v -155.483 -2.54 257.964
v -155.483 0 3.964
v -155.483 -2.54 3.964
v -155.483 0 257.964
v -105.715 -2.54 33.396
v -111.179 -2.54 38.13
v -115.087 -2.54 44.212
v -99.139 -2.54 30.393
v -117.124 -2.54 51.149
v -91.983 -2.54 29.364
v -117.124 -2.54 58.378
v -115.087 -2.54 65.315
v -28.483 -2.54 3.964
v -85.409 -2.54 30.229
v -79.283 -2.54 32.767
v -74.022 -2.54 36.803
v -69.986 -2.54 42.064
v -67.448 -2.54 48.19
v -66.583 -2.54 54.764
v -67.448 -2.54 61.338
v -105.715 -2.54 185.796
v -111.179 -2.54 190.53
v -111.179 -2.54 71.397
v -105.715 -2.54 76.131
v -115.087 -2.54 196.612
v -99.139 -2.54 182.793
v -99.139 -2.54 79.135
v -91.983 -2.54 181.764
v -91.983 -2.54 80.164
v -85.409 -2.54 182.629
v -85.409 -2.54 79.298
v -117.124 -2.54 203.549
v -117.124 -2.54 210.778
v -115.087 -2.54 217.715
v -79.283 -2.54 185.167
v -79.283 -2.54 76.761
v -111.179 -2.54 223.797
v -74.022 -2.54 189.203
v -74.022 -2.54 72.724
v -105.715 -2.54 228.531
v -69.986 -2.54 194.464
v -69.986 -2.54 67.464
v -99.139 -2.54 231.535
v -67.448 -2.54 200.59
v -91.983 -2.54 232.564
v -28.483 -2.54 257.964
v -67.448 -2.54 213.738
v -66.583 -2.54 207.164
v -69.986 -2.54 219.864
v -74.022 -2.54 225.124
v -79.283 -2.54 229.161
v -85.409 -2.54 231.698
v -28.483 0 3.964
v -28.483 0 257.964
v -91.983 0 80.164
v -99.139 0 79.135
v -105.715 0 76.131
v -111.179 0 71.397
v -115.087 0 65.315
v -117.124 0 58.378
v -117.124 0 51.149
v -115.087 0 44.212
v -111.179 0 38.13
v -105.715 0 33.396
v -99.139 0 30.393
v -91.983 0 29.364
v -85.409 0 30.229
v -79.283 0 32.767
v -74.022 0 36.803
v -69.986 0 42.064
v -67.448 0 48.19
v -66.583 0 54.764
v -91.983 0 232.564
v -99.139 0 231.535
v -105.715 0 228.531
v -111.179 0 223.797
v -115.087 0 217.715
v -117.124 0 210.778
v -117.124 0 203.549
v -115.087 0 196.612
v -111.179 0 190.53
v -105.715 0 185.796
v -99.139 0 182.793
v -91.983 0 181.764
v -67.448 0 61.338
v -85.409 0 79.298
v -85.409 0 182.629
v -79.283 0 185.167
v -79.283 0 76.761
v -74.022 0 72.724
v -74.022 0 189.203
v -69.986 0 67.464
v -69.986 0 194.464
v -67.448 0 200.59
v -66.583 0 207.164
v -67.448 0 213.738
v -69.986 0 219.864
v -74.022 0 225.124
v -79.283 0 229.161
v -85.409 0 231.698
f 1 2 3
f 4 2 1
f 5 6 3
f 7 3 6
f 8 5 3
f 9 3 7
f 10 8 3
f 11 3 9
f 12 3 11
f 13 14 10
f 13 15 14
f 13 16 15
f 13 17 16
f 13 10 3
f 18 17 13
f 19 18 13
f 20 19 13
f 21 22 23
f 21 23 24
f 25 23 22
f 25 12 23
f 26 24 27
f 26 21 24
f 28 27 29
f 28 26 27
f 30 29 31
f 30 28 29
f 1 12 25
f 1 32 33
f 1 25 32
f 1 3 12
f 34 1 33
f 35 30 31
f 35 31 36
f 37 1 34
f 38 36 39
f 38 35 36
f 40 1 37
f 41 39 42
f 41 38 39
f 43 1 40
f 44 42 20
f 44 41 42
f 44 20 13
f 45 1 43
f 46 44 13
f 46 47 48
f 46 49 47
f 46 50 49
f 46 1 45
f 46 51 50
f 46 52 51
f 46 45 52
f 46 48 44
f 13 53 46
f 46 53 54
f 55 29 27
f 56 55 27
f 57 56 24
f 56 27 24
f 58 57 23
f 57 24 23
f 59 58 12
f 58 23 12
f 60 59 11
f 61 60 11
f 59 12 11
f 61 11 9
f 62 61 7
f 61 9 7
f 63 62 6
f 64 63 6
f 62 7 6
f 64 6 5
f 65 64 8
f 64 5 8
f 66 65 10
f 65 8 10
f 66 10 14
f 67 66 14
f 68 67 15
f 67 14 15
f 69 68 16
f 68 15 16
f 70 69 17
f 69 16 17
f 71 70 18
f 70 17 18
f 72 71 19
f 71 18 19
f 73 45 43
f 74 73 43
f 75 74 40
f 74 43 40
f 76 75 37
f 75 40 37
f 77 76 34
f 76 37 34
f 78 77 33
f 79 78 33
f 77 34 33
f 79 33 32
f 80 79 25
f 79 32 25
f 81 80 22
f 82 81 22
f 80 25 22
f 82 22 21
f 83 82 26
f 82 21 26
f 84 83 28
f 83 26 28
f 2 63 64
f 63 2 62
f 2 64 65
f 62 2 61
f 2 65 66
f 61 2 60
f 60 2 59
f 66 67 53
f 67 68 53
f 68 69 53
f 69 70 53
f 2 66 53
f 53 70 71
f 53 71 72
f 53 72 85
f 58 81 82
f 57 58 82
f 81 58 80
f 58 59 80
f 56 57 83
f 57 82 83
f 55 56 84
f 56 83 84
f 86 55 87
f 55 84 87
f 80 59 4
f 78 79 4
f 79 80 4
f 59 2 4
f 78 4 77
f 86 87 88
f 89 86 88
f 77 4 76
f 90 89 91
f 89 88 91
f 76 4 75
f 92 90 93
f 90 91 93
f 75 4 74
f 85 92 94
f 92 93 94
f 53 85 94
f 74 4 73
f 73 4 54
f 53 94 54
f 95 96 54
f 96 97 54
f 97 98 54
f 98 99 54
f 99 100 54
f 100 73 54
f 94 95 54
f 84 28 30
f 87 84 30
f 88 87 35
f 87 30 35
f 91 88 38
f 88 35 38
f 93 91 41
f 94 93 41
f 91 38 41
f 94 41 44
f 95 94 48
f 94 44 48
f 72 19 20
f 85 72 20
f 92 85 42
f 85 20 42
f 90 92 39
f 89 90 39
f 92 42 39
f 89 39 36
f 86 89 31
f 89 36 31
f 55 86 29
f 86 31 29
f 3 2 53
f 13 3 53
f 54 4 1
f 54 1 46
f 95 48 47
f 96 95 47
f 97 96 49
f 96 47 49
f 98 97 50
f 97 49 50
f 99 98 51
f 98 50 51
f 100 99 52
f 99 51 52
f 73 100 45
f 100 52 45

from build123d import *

# Parameters (mm, degrees)
F0_W     = 127
F0_H     = 254
F1_DEPTH = 2.54
F3_DEPTH = 25.4
F5_DEPTH = 25.4


with BuildPart() as f1:
    # F0 (on Front) → F1 (new body)
    with BuildSketch(Plane.XZ):
        with Locations((-91.982823, 130.963629)):
            Rectangle(F0_W, F0_H)
    extrude(amount=F1_DEPTH)

    # F2 (on face) → F3 (cut)
    with BuildSketch(Plane.XZ.offset(2.54)):
        with BuildLine():
            Line((-91.982823, 181.763629), (-91.982823, 232.563629))
            ThreePointArc((-91.982823, 232.563629), (-117.382823, 207.163629), (-91.982823, 181.763629))
        make_face()
        with BuildLine():
            ThreePointArc((-66.582823, 207.163629), (-74.02231, 225.124141), (-91.982823, 232.563629))
            Line((-91.982823, 232.563629), (-91.982823, 181.763629))
            ThreePointArc((-91.982823, 181.763629), (-74.02231, 189.203117), (-66.582823, 207.163629))
        make_face()
    extrude(amount=-F3_DEPTH, mode=Mode.SUBTRACT)

    # F4 (on face) → F5 (cut)
    with BuildSketch(Plane.XZ.offset(2.54)):
        with BuildLine():
            ThreePointArc((-91.982823, 80.163629), (-117.382823, 54.763629), (-91.982823, 29.363629))
            Line((-91.982823, 29.363629), (-91.982823, 80.163629))
        make_face()
        with BuildLine():
            Line((-91.982823, 80.163629), (-91.982823, 29.363629))
            ThreePointArc((-91.982823, 29.363629), (-74.02231, 36.803117), (-66.582823, 54.763629))
            ThreePointArc((-66.582823, 54.763629), (-74.02231, 72.724141), (-91.982823, 80.163629))
        make_face()
    extrude(amount=-F5_DEPTH, mode=Mode.SUBTRACT)


solid = f1.part
